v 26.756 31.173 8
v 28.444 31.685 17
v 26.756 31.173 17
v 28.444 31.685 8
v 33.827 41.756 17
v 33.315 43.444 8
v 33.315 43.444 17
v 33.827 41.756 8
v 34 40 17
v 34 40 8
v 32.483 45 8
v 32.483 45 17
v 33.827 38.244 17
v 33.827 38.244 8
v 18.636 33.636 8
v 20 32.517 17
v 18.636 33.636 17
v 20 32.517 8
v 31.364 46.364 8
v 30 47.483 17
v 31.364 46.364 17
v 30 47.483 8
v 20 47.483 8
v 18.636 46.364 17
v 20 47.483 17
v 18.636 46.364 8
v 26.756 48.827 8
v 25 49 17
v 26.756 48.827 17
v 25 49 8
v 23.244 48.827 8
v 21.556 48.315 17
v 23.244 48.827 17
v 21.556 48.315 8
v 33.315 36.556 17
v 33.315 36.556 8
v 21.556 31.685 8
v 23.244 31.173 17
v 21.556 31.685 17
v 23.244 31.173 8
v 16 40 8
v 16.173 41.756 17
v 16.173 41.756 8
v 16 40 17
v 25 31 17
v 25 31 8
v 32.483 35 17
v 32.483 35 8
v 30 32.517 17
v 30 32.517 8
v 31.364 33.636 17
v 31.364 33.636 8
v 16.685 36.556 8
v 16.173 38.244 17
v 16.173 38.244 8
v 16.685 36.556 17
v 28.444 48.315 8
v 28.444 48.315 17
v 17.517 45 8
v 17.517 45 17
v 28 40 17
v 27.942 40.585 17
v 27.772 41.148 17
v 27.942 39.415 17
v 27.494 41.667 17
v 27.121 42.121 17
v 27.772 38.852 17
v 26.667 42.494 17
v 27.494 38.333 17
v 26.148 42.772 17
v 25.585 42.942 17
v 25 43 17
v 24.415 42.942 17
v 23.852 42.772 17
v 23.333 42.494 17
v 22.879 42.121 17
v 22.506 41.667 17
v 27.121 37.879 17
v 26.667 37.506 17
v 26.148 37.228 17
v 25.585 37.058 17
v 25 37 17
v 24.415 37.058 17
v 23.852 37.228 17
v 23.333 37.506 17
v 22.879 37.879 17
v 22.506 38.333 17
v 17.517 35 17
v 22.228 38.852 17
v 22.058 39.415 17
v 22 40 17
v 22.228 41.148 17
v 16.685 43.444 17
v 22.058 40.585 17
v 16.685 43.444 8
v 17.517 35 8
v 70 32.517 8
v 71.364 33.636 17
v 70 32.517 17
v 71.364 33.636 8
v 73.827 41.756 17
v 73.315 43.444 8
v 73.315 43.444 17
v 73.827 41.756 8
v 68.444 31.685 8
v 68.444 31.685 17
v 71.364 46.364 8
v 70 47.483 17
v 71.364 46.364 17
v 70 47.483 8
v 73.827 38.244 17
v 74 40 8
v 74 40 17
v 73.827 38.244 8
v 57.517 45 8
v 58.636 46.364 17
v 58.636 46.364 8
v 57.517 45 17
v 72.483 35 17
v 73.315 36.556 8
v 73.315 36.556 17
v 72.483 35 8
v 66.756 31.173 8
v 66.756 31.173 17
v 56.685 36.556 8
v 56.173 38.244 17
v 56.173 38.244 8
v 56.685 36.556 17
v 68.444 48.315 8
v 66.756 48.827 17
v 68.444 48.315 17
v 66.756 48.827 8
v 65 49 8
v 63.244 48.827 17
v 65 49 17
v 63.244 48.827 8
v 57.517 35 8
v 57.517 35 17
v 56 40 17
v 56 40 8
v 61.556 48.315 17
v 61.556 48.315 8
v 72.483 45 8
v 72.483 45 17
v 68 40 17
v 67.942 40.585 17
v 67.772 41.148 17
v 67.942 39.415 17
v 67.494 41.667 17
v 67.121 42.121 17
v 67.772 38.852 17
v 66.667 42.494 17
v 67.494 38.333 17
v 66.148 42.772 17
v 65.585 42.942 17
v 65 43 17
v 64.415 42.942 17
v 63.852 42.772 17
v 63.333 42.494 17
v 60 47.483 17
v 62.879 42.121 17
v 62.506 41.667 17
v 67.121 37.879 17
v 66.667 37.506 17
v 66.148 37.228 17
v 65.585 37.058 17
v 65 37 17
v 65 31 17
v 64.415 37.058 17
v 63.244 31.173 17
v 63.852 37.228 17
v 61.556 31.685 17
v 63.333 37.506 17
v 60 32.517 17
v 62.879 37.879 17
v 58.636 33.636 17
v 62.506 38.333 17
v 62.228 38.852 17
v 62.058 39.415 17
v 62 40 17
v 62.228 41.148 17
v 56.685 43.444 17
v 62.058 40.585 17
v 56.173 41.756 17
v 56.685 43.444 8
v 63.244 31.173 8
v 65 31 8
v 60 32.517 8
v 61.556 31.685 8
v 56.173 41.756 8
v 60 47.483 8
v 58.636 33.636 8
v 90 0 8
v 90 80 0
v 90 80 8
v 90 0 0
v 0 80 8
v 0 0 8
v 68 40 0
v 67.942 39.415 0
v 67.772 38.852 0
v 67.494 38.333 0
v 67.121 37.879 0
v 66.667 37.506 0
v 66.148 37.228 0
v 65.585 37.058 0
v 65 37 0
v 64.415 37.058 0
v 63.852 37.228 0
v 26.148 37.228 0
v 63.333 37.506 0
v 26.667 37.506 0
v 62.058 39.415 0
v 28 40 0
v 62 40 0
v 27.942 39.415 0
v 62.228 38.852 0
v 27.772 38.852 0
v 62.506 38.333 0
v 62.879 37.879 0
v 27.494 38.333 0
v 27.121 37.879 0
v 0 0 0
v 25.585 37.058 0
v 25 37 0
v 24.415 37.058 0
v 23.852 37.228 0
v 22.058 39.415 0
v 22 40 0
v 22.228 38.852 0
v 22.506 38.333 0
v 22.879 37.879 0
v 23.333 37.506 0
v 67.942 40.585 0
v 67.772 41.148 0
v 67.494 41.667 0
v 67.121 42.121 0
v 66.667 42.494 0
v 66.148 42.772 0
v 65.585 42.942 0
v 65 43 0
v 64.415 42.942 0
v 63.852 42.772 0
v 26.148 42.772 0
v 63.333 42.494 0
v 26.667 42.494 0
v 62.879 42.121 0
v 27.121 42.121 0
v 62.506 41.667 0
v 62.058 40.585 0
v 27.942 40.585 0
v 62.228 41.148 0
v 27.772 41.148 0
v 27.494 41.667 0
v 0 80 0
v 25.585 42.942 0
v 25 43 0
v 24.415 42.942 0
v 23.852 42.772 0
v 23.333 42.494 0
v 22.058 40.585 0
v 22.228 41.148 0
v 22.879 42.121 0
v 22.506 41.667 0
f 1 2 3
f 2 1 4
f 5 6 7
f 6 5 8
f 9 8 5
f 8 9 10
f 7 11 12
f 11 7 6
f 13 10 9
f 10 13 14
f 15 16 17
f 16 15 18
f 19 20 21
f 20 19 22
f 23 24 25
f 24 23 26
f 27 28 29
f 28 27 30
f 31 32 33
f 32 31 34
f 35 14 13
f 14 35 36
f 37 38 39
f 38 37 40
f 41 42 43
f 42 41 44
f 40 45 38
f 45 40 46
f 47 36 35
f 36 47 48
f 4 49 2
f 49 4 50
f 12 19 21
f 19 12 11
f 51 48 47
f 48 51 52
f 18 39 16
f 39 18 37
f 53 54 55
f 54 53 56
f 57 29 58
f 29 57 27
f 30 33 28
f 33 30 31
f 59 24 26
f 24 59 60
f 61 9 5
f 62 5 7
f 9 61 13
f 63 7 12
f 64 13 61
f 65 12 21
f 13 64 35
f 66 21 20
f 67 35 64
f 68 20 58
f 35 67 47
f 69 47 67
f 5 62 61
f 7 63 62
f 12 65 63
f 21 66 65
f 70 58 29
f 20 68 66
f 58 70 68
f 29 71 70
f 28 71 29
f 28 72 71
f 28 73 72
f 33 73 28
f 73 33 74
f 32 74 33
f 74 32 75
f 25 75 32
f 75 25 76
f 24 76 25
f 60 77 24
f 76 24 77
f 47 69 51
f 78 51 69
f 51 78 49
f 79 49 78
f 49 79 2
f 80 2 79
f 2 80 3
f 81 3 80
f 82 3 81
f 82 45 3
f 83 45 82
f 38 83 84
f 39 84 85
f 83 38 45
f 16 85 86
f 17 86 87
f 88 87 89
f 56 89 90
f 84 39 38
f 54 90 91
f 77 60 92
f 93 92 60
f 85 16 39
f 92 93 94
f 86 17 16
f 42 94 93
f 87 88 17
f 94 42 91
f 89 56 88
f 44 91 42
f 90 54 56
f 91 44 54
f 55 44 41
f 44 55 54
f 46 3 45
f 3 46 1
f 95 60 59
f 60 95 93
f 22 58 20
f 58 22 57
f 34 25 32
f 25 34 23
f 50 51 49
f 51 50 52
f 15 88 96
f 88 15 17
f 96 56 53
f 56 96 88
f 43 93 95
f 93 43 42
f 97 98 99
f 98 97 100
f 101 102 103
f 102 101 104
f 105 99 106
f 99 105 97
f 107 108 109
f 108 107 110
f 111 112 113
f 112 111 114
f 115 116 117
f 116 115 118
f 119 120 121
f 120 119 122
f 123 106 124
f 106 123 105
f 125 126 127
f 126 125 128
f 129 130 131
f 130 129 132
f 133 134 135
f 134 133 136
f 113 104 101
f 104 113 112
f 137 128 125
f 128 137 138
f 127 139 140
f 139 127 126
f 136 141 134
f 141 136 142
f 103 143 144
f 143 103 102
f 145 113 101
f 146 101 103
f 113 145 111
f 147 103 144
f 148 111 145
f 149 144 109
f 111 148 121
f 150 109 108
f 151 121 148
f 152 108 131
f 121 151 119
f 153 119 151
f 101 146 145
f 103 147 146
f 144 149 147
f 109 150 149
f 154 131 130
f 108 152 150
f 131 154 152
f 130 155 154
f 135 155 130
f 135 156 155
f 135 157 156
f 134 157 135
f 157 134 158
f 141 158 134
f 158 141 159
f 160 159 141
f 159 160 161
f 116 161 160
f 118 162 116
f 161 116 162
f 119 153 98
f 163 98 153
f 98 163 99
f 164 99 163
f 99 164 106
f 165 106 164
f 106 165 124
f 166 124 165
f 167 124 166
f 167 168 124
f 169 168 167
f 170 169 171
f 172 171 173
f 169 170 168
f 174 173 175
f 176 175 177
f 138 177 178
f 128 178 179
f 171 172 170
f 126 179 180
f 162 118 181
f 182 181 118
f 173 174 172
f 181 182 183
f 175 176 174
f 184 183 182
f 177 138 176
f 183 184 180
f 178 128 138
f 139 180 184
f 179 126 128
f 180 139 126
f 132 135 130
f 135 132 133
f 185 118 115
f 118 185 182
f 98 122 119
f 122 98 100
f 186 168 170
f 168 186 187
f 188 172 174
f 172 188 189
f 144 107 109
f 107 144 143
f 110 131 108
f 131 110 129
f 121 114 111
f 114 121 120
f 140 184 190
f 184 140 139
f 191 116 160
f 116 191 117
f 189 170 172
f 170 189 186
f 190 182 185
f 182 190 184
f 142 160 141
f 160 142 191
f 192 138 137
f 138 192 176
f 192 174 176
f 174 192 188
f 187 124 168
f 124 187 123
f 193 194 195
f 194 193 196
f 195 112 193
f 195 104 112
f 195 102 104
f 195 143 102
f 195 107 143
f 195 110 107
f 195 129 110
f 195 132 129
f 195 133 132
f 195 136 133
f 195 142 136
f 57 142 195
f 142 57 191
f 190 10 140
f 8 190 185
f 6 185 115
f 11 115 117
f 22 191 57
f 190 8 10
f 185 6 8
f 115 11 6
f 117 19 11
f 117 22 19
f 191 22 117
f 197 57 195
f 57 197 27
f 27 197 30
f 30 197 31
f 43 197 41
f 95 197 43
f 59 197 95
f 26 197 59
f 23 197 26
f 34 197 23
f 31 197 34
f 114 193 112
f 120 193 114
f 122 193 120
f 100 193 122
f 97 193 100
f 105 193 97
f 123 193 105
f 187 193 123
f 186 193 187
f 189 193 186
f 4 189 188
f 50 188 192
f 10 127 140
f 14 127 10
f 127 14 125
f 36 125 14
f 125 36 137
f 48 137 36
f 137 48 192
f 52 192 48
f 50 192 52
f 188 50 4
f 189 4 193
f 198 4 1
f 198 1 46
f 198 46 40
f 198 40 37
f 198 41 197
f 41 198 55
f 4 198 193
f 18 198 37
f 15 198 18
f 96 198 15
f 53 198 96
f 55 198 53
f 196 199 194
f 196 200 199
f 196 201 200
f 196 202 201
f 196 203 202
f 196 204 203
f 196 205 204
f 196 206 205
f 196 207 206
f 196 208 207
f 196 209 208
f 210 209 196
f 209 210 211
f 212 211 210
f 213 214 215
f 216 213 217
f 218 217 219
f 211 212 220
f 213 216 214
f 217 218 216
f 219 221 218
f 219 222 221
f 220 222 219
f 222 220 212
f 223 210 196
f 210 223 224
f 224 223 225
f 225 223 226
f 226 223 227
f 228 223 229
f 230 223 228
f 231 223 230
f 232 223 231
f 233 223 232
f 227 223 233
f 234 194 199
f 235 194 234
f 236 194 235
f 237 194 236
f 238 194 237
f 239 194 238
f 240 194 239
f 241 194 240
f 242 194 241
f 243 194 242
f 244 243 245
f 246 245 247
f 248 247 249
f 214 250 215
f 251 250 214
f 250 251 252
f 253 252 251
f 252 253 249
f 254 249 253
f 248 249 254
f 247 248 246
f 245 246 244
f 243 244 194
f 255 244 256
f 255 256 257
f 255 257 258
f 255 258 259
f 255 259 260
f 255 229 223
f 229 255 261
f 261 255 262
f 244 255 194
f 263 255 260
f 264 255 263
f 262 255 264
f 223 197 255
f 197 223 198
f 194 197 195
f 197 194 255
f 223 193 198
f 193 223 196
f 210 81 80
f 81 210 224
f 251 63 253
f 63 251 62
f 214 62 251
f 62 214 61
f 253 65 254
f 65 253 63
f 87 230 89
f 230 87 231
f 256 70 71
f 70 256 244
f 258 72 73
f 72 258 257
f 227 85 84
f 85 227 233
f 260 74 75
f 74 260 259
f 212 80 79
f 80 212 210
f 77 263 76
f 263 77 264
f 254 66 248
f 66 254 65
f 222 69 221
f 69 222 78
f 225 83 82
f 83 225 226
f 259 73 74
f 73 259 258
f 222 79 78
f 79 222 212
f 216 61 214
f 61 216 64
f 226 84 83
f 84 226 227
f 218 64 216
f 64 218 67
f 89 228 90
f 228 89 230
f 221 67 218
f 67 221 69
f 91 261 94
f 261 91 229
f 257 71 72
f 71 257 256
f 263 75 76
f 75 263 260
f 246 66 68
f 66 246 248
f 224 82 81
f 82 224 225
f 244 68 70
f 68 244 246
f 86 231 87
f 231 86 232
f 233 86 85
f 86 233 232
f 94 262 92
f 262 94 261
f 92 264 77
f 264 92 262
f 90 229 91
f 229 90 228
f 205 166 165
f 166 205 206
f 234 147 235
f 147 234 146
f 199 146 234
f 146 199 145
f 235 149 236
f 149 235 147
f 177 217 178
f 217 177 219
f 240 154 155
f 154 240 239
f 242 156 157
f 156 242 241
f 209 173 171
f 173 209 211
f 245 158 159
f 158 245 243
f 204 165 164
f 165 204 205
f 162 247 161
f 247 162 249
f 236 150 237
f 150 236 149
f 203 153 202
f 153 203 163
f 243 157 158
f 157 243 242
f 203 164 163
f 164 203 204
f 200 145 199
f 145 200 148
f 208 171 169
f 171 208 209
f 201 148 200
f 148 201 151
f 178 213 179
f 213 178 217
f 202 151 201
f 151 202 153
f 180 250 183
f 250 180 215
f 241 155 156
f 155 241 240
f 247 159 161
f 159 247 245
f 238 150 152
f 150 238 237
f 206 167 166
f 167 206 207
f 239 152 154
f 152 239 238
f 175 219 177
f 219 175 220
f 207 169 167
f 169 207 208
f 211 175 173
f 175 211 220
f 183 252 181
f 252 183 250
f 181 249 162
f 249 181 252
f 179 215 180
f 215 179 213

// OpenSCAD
$fn = 32;

// ----------------------------------------------------------------------
// Drill jig: two_boss jig
// ----------------------------------------------------------------------

// --- parameters (mm) ---
plate_l = 90;             // plate length, X
plate_w = 80;             // plate width, Y
plate_t = 8;              // plate thickness
boss_d = 18;              // guide boss diameter
boss_h = 10;              // boss height above the plate
guide_d = 6;              // guide hole diameter
boss_pitch = 40;          // boss pitch

n_boss = 2;  // guide bosses
boss_x0 = (plate_l - (n_boss - 1) * boss_pitch) / 2;  // first boss X
boss_top = plate_t - 1 + boss_h;  // boss crown height
total_h = boss_top;  // overall height

difference() {
  union() {
  cube([plate_l, plate_w, plate_t]);
  for (i = [0 : n_boss - 1])
    translate([boss_x0 + i * boss_pitch, plate_w / 2, plate_t - 1])
      cylinder(h = boss_h, d = boss_d);
  }
  for (i = [0 : n_boss - 1])
    translate([boss_x0 + i * boss_pitch, plate_w / 2, -1])
      cylinder(h = plate_t + boss_h, d = guide_d);
}
